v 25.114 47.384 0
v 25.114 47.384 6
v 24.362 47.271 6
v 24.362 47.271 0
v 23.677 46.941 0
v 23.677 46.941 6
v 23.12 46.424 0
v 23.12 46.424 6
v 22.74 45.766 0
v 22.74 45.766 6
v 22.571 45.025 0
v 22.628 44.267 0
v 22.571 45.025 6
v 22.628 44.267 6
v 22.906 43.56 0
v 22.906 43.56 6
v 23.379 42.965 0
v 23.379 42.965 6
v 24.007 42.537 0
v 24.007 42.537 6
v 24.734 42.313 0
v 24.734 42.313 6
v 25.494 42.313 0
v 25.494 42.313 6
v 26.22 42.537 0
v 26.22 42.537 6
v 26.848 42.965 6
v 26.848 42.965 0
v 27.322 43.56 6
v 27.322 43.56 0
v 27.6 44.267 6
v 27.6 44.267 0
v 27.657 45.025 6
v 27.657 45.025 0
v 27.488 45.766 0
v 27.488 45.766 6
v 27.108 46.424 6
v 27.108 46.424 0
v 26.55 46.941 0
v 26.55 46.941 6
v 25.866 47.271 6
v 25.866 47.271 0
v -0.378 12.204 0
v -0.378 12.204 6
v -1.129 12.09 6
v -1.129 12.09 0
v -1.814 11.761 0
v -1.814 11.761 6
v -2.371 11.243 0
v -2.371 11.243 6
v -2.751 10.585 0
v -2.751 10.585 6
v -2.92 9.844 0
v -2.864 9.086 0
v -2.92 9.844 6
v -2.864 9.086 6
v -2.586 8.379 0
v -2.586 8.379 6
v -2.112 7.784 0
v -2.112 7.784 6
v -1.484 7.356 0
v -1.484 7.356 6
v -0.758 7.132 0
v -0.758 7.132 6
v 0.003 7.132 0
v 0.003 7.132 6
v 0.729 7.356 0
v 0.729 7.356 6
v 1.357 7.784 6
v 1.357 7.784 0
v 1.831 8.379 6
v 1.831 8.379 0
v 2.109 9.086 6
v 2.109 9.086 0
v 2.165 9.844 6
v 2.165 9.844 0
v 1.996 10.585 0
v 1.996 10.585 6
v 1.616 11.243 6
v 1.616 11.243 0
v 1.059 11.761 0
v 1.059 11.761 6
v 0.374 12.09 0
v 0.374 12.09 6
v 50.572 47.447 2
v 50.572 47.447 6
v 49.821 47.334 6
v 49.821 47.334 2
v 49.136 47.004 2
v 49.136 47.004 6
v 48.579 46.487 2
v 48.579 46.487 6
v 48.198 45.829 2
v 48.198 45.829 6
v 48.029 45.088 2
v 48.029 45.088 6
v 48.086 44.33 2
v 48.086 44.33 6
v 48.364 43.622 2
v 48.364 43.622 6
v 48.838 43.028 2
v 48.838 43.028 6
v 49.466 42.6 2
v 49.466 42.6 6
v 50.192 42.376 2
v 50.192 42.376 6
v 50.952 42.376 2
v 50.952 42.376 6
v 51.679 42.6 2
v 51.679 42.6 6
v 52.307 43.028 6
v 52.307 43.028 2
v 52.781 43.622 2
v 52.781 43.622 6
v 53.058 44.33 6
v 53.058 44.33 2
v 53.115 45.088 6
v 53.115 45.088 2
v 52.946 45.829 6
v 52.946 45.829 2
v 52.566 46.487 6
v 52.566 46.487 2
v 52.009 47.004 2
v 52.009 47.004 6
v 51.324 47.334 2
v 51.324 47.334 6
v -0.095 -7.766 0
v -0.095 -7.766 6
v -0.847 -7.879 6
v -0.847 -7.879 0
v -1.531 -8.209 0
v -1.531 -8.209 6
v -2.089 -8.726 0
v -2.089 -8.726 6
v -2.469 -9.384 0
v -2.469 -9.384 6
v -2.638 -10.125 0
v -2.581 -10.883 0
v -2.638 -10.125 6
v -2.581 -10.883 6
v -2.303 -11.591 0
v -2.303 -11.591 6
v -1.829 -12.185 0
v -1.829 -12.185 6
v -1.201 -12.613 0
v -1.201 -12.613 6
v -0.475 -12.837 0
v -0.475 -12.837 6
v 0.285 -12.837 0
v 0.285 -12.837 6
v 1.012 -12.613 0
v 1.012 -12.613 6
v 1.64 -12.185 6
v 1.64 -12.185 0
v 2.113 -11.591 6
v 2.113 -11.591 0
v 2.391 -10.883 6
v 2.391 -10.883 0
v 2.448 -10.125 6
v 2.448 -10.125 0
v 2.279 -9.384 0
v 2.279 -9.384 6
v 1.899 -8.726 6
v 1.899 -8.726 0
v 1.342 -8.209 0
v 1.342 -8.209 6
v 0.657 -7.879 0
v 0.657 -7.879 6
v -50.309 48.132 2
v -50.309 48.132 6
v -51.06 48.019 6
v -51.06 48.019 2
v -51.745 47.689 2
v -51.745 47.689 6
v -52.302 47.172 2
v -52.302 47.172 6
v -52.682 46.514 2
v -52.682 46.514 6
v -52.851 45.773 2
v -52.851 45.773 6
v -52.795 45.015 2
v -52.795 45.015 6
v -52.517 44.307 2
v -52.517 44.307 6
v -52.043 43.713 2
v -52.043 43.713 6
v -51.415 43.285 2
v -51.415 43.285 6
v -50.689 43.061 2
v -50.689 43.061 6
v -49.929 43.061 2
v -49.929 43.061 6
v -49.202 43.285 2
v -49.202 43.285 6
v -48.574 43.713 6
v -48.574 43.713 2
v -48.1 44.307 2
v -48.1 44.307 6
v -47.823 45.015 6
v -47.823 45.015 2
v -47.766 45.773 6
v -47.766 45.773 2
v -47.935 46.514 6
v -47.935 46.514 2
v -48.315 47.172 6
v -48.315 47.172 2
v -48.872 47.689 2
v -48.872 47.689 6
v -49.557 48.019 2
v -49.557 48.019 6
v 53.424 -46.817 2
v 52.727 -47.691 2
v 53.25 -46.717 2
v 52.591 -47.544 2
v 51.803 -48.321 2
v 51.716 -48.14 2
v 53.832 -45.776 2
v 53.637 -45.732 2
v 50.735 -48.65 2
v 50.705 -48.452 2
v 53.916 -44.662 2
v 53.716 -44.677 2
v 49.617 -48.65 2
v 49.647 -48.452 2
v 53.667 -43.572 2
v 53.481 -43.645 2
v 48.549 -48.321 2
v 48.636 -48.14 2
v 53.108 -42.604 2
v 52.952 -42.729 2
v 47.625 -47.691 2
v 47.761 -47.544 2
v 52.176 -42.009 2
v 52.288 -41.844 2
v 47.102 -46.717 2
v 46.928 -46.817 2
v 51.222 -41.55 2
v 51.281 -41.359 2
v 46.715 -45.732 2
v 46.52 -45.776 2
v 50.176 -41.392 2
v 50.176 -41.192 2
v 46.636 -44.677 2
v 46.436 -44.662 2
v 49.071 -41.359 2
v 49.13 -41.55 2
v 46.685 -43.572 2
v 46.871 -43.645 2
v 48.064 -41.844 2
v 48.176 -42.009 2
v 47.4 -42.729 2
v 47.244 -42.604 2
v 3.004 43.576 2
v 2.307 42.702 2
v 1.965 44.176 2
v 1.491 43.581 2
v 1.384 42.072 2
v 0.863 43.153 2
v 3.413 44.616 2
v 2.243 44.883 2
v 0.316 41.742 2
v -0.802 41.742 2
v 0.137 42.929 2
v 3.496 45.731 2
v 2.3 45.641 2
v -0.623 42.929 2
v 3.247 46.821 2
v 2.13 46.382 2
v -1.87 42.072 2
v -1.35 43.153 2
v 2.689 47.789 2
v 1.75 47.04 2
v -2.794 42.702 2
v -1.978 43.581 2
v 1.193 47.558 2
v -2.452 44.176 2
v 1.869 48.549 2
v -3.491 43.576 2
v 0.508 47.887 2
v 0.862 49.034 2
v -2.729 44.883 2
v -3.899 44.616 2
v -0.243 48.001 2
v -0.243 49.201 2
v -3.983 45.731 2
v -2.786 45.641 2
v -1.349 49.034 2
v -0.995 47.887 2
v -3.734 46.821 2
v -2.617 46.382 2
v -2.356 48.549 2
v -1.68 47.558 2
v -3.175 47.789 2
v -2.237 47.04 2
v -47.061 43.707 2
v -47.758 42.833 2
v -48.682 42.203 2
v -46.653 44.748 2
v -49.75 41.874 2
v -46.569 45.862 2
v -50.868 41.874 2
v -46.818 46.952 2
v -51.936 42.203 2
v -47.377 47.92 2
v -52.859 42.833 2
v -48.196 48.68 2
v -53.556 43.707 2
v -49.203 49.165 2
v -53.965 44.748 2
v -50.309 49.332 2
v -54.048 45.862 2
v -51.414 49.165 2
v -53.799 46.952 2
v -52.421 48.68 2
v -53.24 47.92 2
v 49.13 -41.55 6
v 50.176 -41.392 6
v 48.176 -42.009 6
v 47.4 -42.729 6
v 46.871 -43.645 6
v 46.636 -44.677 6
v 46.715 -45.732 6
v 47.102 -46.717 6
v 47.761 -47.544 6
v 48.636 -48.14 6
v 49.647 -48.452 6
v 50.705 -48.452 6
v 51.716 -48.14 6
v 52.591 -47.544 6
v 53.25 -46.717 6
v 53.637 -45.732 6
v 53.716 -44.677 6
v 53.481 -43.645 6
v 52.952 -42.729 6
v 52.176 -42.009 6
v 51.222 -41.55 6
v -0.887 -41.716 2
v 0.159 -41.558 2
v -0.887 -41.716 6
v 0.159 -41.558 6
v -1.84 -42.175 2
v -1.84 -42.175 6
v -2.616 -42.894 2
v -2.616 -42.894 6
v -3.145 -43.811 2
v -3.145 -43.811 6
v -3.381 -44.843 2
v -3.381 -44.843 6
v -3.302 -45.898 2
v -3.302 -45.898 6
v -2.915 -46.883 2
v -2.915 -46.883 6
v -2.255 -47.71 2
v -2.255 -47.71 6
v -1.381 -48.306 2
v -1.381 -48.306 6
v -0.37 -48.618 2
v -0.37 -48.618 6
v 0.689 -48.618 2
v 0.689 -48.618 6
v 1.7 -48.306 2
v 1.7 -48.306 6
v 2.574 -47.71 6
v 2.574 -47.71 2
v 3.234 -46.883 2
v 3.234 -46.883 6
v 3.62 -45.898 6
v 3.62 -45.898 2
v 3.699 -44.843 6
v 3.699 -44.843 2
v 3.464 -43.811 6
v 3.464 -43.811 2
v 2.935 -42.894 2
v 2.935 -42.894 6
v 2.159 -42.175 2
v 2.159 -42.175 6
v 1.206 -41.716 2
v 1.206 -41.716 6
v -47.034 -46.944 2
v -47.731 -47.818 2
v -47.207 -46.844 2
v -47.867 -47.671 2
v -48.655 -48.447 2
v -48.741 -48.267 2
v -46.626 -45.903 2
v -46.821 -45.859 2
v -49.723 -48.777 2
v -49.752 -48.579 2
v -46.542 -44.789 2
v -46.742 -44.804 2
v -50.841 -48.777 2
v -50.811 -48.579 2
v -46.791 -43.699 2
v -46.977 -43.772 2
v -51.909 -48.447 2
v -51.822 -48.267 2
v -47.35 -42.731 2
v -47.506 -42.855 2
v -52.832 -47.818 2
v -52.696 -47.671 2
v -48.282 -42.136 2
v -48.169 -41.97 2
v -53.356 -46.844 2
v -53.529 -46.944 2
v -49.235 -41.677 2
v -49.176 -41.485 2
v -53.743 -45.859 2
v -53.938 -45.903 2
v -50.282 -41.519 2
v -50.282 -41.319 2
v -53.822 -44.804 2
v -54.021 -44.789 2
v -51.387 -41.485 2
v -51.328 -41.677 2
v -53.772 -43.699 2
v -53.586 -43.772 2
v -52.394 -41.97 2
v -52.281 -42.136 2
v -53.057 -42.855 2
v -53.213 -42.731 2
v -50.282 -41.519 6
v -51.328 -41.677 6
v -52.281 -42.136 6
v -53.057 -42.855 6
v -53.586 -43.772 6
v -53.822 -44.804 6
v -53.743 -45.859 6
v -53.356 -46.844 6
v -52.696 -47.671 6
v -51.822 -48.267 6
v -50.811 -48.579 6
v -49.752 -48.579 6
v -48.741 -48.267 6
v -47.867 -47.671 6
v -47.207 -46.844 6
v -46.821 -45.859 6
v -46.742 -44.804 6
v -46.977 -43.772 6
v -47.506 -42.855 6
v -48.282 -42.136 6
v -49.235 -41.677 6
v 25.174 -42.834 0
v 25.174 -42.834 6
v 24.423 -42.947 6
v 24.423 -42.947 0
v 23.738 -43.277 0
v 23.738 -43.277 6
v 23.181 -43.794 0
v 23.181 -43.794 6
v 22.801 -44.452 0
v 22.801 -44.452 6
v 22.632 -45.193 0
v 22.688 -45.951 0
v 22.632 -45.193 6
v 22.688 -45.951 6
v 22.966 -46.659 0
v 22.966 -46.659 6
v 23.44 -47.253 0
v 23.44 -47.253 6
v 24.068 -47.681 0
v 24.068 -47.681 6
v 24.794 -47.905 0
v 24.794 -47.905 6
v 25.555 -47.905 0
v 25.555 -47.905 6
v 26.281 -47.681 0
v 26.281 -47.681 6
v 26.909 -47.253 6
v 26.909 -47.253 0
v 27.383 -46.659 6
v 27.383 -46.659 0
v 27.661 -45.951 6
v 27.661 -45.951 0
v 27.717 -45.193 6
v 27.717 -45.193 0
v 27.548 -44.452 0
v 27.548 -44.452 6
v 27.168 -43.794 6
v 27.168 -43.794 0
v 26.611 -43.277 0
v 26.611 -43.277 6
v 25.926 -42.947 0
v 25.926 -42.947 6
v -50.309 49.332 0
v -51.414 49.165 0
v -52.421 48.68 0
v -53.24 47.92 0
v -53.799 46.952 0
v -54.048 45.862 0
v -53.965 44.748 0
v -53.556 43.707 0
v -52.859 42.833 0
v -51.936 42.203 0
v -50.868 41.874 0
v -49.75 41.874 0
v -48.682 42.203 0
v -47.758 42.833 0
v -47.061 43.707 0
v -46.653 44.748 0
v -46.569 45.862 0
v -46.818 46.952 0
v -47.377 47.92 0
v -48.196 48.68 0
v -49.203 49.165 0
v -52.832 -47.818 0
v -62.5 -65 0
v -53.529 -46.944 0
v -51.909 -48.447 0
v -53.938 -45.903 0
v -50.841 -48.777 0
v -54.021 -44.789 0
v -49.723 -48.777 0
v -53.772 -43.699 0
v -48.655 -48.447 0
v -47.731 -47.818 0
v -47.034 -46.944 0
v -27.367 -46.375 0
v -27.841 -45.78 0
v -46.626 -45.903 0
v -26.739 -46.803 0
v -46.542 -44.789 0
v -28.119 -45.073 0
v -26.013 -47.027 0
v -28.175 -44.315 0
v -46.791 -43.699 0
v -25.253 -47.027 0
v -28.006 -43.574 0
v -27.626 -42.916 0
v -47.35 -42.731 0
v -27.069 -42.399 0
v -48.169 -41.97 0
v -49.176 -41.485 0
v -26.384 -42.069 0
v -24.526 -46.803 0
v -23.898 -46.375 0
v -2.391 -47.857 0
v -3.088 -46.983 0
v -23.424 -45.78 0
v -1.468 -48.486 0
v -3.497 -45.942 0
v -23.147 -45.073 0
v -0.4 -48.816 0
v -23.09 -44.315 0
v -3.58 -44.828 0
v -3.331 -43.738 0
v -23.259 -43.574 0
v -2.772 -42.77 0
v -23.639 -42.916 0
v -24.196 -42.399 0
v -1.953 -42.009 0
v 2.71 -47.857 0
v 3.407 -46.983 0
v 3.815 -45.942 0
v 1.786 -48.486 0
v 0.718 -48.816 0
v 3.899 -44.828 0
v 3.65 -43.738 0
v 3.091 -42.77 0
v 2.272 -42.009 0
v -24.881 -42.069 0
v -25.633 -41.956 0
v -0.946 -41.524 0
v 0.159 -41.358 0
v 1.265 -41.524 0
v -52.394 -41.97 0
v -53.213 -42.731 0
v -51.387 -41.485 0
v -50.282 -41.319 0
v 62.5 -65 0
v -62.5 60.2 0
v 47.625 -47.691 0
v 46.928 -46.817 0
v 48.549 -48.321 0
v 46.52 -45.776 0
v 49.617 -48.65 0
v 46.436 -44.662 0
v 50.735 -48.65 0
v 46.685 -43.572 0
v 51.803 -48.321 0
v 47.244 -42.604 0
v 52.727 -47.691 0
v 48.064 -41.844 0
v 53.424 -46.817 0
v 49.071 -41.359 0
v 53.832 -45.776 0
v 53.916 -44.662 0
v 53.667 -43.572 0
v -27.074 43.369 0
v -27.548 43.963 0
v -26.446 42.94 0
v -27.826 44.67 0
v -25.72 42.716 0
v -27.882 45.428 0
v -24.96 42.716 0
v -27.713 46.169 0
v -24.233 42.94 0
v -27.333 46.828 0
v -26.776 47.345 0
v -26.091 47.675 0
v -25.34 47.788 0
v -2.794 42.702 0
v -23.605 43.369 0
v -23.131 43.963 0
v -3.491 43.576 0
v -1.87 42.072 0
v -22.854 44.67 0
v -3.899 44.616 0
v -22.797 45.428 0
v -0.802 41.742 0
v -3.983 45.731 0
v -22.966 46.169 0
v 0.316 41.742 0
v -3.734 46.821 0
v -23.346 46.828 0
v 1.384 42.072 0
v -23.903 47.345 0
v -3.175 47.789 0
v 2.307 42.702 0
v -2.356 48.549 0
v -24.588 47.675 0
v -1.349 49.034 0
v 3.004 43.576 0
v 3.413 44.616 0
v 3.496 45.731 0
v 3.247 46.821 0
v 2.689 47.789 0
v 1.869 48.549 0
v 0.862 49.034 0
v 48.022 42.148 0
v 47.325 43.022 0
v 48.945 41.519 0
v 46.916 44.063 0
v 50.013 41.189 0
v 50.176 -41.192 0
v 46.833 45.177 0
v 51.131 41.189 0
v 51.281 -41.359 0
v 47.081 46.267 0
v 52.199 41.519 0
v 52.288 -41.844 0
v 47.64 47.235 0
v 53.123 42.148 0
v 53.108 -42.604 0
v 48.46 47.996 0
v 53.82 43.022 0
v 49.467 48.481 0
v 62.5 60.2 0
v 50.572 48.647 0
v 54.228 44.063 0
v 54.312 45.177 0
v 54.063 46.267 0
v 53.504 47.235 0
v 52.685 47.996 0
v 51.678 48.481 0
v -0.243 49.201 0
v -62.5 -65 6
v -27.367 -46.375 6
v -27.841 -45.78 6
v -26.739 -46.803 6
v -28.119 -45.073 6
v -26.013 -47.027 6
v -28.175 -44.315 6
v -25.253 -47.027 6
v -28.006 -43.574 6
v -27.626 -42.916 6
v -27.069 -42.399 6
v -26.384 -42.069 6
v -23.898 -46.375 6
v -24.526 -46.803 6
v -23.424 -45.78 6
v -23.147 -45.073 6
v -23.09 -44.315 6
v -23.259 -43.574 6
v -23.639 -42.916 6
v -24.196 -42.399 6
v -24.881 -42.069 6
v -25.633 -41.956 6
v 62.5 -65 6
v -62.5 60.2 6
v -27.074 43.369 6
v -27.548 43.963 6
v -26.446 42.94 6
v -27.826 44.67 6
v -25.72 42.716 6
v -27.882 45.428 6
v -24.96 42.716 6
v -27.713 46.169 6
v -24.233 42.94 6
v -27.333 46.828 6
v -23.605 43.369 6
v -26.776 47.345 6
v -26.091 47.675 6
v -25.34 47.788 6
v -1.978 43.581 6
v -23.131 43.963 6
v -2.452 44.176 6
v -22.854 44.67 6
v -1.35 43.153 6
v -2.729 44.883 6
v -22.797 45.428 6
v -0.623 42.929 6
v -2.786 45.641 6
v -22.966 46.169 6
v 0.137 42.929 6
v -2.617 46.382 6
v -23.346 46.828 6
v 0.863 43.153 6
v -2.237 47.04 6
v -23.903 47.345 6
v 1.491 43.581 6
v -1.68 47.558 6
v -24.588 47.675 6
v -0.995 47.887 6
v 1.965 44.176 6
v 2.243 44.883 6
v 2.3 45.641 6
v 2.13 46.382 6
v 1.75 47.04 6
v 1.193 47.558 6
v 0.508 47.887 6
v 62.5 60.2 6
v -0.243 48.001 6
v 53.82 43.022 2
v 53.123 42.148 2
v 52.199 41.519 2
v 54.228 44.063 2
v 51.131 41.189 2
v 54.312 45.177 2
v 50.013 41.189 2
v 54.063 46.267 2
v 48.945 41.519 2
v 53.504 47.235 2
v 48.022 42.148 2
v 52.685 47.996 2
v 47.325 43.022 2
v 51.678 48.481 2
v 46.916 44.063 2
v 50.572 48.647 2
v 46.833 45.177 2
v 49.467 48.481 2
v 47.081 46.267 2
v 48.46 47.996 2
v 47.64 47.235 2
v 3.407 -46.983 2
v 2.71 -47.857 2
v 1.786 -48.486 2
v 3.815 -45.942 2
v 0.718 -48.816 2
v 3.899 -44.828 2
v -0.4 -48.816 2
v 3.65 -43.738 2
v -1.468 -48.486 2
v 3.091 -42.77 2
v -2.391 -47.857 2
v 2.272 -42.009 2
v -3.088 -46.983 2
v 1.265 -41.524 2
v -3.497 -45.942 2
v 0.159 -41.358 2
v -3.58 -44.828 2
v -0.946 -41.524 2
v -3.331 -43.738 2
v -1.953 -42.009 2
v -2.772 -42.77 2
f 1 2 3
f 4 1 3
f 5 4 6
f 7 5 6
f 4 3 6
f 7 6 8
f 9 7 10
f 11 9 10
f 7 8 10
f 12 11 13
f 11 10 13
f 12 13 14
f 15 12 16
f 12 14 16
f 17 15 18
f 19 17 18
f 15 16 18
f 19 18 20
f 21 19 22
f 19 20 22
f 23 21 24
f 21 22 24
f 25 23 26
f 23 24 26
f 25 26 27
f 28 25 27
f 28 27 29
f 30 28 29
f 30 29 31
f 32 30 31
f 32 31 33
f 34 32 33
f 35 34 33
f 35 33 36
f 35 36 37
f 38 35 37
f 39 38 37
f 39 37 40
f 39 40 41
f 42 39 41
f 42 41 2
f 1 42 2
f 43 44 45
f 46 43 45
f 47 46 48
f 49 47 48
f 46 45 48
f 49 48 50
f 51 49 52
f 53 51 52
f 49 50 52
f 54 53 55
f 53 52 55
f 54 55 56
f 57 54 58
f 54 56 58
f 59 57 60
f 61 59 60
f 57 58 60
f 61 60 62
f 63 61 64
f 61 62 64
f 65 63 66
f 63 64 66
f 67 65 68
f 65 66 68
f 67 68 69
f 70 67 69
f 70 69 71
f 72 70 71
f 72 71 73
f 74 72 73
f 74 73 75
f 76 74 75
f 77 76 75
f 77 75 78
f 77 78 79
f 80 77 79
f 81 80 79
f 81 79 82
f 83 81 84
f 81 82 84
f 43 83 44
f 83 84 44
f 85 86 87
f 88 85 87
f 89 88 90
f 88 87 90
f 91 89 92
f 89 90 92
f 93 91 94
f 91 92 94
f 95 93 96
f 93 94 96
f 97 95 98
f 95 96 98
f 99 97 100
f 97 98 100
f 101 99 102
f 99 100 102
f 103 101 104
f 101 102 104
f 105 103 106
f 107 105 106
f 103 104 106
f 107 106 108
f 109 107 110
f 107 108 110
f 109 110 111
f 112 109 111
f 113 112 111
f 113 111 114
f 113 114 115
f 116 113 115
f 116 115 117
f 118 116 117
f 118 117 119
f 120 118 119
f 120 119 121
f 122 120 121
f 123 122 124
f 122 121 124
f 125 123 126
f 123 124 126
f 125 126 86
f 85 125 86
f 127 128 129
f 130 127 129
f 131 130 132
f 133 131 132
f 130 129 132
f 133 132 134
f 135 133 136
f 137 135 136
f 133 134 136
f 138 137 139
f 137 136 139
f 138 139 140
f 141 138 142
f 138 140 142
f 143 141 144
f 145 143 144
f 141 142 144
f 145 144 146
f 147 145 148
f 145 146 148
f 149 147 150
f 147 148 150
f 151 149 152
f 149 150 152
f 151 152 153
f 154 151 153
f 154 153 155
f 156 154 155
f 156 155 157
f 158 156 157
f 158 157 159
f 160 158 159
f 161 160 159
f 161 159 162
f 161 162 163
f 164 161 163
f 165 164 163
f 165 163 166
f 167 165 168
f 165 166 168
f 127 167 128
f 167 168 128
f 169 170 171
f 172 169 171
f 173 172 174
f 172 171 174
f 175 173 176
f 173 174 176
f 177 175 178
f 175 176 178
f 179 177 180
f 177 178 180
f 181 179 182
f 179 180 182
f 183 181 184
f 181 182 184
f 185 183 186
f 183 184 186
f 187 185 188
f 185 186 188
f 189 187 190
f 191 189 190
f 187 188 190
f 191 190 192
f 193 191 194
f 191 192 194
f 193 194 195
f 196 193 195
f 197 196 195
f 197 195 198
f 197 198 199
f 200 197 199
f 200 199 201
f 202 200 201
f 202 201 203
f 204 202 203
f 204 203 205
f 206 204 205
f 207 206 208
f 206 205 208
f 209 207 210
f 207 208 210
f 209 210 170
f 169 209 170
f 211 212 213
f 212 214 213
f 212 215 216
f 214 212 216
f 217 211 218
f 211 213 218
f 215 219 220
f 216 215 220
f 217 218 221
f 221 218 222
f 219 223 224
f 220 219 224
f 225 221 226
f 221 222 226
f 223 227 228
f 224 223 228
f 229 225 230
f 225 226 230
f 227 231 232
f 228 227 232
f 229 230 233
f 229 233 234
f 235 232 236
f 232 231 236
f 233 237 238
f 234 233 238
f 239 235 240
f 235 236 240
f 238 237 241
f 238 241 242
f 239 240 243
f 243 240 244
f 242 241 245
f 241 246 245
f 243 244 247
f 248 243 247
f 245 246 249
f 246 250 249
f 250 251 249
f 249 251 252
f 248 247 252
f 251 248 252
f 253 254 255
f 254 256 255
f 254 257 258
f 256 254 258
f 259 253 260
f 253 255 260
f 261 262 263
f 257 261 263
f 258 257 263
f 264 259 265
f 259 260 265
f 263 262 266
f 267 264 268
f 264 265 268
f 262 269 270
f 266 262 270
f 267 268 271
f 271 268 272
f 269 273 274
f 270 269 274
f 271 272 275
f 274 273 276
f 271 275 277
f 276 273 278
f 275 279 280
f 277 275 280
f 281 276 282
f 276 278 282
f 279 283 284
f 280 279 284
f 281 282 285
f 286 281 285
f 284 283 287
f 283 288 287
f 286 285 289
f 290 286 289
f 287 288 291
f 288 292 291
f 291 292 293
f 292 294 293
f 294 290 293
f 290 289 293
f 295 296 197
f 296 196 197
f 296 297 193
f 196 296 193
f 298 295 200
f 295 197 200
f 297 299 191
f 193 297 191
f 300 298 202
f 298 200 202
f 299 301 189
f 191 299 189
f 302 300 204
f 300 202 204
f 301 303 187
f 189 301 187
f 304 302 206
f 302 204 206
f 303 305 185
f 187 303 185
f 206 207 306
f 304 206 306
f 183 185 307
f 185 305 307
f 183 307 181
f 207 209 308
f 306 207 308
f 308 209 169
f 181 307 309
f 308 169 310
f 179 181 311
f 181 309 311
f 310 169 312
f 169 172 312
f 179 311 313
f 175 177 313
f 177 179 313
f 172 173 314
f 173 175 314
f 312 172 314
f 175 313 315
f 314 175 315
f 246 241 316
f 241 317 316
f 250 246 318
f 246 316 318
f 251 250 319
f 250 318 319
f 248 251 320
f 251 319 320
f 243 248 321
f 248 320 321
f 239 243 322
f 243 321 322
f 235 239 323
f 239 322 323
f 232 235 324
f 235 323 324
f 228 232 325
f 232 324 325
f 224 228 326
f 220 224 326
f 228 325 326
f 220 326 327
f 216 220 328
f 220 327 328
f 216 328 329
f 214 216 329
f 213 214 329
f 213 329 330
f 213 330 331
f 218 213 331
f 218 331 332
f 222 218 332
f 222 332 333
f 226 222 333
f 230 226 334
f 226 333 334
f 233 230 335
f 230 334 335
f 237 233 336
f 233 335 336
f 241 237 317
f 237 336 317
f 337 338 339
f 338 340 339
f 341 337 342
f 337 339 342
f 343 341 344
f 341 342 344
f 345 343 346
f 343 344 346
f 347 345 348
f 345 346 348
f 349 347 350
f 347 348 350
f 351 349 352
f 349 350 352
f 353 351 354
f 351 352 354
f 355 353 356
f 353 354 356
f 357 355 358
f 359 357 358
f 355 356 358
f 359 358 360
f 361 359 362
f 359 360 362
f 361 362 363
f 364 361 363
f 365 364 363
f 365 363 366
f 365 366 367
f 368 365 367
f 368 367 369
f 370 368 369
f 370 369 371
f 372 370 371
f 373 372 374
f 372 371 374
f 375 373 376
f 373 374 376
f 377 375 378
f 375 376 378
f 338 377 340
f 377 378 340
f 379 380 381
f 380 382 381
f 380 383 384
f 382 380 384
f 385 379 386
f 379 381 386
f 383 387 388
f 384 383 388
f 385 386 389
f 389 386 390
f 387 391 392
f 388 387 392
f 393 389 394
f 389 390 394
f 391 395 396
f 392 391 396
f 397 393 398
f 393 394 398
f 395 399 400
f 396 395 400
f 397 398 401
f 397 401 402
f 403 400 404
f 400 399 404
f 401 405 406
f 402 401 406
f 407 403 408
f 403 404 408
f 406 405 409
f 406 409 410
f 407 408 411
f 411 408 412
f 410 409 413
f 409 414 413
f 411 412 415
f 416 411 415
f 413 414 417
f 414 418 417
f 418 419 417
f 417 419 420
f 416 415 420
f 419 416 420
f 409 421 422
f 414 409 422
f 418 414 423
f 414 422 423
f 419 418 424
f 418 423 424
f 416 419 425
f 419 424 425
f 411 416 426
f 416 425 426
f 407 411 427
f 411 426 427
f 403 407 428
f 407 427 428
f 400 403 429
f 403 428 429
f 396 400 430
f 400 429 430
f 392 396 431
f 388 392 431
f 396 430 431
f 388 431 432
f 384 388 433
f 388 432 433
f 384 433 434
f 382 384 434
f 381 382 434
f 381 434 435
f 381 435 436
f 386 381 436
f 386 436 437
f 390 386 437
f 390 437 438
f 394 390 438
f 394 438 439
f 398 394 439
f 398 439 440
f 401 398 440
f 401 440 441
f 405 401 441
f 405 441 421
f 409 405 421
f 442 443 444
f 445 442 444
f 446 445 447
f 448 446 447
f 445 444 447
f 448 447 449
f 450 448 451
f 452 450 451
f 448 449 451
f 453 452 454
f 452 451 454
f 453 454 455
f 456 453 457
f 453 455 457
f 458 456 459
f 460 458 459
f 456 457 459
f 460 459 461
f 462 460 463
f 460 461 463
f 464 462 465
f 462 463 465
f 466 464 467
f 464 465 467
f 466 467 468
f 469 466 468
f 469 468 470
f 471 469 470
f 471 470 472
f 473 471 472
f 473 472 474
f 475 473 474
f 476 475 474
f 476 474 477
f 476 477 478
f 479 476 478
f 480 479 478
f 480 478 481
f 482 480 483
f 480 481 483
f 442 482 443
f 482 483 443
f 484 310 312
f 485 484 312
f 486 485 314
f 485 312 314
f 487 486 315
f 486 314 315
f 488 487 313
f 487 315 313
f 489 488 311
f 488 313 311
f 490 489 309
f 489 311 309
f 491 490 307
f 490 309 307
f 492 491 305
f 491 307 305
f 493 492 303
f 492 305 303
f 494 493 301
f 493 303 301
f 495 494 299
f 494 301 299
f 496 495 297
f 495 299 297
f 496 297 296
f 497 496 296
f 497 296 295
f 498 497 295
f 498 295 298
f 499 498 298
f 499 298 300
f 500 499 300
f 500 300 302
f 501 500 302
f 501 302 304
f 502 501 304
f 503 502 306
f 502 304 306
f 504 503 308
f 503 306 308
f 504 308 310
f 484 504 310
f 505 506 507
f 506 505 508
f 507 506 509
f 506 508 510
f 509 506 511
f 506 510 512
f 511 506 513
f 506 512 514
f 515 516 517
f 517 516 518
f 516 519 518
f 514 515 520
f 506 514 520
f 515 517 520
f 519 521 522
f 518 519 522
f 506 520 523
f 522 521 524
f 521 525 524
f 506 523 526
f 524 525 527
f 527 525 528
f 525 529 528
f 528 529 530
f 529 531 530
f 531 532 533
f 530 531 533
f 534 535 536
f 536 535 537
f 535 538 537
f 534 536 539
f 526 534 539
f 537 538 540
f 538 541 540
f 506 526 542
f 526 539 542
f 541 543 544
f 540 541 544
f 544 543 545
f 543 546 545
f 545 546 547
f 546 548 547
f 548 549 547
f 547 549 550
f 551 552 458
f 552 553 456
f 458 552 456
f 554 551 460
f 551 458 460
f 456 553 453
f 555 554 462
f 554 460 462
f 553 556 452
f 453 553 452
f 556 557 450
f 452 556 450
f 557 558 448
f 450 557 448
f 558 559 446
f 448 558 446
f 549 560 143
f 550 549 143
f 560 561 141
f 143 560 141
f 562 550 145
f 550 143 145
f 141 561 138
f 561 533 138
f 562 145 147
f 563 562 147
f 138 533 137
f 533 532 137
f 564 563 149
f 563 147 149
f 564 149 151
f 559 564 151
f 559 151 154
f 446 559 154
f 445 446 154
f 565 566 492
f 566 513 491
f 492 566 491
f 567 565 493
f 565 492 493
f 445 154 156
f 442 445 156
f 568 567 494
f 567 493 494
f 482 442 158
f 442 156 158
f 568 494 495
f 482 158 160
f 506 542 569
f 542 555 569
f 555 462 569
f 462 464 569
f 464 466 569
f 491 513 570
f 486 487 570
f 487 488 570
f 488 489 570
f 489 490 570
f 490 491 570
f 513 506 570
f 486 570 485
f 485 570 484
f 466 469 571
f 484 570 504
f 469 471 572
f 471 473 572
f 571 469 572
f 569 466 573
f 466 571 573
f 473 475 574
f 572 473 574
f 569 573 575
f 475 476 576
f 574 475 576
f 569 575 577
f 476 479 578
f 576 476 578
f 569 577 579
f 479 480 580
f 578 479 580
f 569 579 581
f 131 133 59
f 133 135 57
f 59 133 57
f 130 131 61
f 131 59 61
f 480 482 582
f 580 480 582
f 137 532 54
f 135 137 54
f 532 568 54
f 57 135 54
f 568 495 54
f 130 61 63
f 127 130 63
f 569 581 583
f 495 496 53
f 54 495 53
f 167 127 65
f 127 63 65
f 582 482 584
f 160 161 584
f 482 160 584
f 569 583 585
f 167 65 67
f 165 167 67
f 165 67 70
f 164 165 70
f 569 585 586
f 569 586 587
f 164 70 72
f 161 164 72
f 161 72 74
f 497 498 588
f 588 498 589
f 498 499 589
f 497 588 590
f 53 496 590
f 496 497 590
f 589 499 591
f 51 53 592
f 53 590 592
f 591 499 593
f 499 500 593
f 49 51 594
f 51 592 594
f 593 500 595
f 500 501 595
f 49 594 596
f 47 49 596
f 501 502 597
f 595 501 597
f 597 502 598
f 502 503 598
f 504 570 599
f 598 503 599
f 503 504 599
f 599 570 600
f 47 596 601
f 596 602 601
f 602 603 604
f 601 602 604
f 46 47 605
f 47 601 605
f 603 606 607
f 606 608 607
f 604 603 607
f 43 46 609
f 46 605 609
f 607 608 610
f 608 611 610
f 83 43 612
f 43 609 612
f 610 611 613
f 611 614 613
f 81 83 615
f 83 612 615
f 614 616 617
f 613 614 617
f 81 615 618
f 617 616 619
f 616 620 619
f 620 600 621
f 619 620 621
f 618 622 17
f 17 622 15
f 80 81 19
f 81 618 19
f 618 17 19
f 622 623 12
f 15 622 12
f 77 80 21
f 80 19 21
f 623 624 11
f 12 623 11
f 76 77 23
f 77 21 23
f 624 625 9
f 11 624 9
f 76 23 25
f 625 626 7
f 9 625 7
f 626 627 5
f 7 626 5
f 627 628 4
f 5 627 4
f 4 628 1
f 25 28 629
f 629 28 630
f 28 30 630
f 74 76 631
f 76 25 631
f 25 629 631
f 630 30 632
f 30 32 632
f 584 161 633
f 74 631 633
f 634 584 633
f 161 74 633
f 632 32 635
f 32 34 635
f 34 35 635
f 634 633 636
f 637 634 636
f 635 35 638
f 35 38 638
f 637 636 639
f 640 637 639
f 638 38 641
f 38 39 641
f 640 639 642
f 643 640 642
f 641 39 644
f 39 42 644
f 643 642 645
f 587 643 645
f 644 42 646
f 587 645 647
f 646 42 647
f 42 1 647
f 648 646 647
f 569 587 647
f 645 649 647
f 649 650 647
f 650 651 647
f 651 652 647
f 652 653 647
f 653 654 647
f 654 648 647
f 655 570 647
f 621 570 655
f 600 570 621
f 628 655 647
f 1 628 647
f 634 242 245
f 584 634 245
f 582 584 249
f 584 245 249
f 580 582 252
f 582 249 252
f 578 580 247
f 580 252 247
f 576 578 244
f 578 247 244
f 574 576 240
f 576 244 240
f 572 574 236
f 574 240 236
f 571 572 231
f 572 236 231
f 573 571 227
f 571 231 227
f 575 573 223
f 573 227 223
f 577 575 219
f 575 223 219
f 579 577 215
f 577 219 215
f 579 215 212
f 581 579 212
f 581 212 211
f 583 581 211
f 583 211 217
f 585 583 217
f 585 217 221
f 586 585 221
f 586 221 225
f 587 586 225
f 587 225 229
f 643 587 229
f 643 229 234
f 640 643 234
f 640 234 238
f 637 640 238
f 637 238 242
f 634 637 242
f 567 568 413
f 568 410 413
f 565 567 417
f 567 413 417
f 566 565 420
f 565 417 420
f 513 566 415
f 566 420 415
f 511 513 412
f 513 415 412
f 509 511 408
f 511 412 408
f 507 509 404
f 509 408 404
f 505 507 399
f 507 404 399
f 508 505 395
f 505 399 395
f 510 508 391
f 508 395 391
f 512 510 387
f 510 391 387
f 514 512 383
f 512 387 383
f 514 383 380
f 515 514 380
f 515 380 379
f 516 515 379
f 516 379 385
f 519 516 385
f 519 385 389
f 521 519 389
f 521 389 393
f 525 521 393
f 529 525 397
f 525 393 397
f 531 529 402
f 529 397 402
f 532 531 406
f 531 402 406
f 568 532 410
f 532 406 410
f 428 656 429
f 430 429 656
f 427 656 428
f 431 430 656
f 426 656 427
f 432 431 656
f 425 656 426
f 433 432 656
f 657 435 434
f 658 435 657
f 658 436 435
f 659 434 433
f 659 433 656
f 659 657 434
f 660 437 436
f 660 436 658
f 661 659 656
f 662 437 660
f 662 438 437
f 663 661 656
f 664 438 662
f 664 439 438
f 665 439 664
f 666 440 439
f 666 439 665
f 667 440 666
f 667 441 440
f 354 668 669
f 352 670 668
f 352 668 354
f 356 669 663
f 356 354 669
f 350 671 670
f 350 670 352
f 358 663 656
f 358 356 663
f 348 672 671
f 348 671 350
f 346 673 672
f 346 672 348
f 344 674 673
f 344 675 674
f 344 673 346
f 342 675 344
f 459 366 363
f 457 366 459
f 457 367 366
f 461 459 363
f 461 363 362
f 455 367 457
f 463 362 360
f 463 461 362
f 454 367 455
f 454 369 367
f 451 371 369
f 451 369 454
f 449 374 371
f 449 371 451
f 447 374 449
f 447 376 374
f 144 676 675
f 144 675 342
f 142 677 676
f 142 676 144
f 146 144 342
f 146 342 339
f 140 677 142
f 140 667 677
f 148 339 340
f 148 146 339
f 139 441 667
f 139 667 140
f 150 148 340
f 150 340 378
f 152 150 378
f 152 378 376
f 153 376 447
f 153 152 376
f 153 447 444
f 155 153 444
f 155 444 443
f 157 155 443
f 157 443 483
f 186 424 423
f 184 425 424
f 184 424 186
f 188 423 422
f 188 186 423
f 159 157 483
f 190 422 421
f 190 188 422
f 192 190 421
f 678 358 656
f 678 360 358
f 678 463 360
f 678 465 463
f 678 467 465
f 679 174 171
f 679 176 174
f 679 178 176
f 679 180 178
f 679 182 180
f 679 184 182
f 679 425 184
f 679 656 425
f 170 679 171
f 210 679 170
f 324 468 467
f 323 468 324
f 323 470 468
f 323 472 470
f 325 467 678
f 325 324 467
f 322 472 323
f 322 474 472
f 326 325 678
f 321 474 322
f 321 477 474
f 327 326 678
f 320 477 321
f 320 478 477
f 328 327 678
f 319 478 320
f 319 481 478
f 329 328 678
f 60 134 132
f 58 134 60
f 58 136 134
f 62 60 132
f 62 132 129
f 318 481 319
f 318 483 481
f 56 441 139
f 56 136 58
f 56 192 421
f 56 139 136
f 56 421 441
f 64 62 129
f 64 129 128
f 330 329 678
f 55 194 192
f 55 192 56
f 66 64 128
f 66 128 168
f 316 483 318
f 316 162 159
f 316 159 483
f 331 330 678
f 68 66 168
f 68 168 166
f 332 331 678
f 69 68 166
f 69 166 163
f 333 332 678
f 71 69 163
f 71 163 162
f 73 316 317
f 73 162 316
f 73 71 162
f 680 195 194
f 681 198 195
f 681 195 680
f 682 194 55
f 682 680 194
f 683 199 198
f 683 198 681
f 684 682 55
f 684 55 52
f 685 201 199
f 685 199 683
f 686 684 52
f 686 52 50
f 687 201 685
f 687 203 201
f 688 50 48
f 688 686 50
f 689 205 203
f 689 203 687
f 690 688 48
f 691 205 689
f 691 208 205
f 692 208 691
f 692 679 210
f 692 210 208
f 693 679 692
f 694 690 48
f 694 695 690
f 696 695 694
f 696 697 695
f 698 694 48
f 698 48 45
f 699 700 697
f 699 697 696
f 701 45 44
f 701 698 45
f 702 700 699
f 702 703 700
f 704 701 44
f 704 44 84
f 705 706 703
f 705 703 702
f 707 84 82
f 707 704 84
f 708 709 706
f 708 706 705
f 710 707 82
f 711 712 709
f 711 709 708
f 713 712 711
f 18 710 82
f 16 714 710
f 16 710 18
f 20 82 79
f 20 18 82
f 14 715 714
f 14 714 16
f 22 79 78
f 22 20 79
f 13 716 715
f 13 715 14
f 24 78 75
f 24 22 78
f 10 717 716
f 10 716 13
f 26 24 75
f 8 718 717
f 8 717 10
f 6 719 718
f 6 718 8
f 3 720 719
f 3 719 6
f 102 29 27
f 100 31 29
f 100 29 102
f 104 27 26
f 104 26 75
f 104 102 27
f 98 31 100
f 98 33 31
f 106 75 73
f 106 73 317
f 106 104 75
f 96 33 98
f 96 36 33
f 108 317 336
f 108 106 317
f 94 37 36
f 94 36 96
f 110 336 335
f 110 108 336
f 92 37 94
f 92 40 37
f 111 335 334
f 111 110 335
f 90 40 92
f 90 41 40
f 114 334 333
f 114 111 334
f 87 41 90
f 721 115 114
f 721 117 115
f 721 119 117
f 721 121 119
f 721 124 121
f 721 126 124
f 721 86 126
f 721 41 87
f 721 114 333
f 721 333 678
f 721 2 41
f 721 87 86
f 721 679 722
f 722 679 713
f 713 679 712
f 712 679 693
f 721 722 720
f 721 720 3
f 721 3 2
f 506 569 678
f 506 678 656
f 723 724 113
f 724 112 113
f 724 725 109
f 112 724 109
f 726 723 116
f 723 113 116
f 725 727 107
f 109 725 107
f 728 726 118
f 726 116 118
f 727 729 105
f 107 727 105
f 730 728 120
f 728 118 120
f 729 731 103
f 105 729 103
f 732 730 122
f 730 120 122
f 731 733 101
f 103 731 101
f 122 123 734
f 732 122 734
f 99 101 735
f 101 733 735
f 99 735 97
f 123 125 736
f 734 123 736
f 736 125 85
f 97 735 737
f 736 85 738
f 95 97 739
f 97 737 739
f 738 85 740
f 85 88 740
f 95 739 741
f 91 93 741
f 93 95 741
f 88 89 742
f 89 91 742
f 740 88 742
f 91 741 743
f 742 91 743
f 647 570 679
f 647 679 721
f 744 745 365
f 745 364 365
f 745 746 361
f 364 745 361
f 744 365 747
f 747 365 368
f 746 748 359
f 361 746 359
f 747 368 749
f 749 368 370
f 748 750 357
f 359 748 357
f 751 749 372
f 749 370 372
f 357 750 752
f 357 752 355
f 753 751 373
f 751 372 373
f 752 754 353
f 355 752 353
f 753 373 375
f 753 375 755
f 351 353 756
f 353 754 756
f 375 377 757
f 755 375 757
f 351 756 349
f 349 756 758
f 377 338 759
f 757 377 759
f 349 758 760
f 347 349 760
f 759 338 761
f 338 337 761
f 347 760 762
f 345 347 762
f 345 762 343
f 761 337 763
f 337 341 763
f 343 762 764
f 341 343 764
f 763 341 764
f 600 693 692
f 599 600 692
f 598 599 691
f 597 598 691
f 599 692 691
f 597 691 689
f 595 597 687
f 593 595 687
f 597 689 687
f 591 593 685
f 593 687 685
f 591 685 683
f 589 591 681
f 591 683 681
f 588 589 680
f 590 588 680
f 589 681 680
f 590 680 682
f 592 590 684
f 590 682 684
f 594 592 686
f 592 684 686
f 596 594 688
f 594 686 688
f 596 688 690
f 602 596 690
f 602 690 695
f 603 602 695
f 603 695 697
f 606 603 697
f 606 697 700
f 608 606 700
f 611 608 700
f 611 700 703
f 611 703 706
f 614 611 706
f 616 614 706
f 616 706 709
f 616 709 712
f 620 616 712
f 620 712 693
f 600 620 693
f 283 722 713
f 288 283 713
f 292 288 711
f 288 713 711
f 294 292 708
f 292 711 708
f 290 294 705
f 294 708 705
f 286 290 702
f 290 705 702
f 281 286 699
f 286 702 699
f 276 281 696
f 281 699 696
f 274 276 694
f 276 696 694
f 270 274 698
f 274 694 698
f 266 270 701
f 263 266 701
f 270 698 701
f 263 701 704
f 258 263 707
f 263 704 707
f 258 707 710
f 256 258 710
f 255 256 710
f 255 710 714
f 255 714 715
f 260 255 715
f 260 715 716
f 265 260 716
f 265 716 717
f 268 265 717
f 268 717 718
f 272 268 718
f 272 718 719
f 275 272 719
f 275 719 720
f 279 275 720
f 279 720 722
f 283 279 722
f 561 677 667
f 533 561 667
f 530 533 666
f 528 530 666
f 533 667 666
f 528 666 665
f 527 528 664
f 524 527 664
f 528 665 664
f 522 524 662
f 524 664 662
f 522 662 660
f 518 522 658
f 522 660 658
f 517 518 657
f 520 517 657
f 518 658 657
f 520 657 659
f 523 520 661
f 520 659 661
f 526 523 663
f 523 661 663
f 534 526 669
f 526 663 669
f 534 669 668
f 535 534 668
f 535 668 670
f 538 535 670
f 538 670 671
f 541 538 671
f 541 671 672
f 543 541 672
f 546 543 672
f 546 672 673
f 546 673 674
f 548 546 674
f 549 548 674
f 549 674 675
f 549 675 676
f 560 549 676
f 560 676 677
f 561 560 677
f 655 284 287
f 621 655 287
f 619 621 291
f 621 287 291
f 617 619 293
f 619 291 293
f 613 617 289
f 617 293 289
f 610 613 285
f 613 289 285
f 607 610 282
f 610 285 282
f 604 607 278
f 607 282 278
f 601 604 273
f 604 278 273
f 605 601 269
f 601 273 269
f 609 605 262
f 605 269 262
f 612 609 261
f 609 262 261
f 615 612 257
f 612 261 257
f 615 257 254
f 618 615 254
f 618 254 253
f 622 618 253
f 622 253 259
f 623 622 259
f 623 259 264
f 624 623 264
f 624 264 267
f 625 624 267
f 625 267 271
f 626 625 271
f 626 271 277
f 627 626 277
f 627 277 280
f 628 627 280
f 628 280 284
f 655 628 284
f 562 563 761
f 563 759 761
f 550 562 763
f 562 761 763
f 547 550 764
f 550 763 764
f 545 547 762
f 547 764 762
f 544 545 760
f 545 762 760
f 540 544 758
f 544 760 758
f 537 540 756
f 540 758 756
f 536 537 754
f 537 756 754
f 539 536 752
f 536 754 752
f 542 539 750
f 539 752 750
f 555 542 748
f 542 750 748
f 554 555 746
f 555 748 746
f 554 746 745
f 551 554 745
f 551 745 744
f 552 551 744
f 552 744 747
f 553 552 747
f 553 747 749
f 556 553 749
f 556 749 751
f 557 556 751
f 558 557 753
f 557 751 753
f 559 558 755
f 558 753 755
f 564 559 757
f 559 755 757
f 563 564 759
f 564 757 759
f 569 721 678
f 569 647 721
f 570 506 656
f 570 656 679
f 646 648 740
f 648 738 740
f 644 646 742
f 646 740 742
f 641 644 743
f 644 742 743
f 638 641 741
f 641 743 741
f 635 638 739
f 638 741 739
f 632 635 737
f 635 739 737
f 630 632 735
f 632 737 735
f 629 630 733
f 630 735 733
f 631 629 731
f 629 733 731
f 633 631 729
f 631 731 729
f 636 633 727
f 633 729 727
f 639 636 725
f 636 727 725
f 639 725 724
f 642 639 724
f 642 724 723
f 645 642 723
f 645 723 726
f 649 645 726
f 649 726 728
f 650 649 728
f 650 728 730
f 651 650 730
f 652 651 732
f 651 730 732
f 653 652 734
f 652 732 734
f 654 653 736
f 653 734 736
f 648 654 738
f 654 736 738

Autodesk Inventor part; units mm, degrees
ref_plane "YZ Plane" through (0, 0, 0) normal (1, 0, 0) x (0, 1, 0)
ref_plane "XZ Plane" through (0, 0, 0) normal (0, 1, 0) x (-1, 0, 0)
ref_plane "XY Plane" through (0, 0, 0) normal (0, 0, 1) x (1, 0, 0)
ref_plane "Work Plane1" through (0, 0, 0) normal (0, 0, 1) x (1, 0, 0)
sketch "Sketch1" plane through (0, 0, 0) normal (0, 0, 1) x (1, 0, 0)
  line L0 (-62.5, -65) -> (-62.5, 60.2) projected
  line L1 (62.5, -65) -> (-62.5, -65) projected
  line L2 (-62.5, 60.2) -> (62.5, 60.2) projected
  line L3 (62.5, 60.2) -> (62.5, -65) projected
  circle A0 centre (50.2, 45) radius 2.55 projected
  circle A1 centre (50.2, -45) radius 3.55 projected
  circle A2 centre (-50.2, -45) radius 2.55 projected
  circle A3 centre (-50.2, 45) radius 2.55 projected
  line L4 (-50.2, -87.1872) -> (-50.2, 86.9163) construction
  line L5 (0, -90.5792) -> (0, 86.9163) construction
  line L6 (50.2, -82.9351) -> (50.2, 98.888) construction
  line L7 (-25.1, -100.0293) -> (-25.1, 98.888) construction
  line L8 (25.1, -87.1872) -> (25.1, 98.888) construction
  line L9 (-84.1215, -10) -> (86.0151, -10) construction
  line L10 (-84.1215, 10) -> (86.0151, 10) construction
  point P0 (0, 0)
  point P1 (0, 45)
  point P2 (0, -45)
  point P3 (-25.1, -45)
  point P4 (25.1, -45)
  point P5 (25.1, 45)
  point P6 (-25.1, 45)
  point P7 (0, 0)
  point P8 (0, -10)
  point P9 (0, 10)
  dimension "d0" = 100.4
  dimension "d1" = 50.2
  dimension "d2" = 25.1
  dimension "d3" = 25.1
  dimension "d4" = 10
  dimension "d5" = 20
extrude "Extrusion1" add sketch "Sketch1" along normal blind 6 contours L0 L2 L3 L1 | A0 | A1 | A2 | A3
sketch "Sketch2" plane through (0, 0, 0) normal (0, 0, -1) x (-1, 0, 0)
  point P0 (0, 0)
  point P1 (-50.176, -44.9419)
  point P2 (-0.1594, -45.1078)
  point P3 (50.2816, -45.0688)
hole "Hole1" at (50.176, -44.9419, 0) at (0.1594, -45.1078, 0) at (-50.2816, -45.0688, 0) direction (0, 0, 1) diameter 7.1 end through all counterbore diameter 7.5 counterbore depth 2
sketch "Sketch3" plane through (0, 0, 0) normal (0, 0, -1) x (-1, 0, 0)
  point P0 (0, 0)
  point P1 (50.3086, 45.5821)
  point P2 (0.2433, 45.4506)
  point P3 (-50.5722, 44.8972)
hole "Hole2" at (-50.3086, 45.5821, 0) at (-0.2433, 45.4506, 0) at (50.5722, 44.8972, 0) direction (0, 0, 1) diameter 5.1 end through all counterbore diameter 7.5 counterbore depth 2
sketch "Sketch4" plane through (0, 0, 0) normal (0, 0, -1) x (-1, 0, 0)
  point P0 (0, 0)
  point P1 (25.3396, 45.2378)
  point P2 (-25.1139, 44.8345)
  point P3 (-25.1745, -45.3838)
  point P4 (25.6326, -44.5055)
  point P5 (0.0949, -10.3157)
  point P6 (0.3775, 9.6536)
hole "Hole3" at (25.1139, 44.8345, 0) at (-25.3396, 45.2378, 0) at (25.1745, -45.3838, 0) at (-25.6326, -44.5055, 0) at (-0.0949, -10.3157, 0) at (-0.3775, 9.6536, 0) direction (0, 0, 1) diameter 5.1 end through all
sketch "Sketch5" plane through (0, 0, 6) normal (0, 0, 1) x (1, 0, 0)
  line L0 (54.8683, -25.7428) -> (1.0212, -25.7428) construction
  line L1 (1.0212, -25.7428) -> (1.0212, -17.8731) construction
  line L2 (1.0212, -17.8731) -> (54.8683, -17.8731) construction
  line L3 (54.8683, -17.8731) -> (54.8683, -25.7428) construction
  point P0 (0, 0)
equation "\"d1\" = 0.5 * d0"
equation "\"d2\" = 0.5 * d1"
equation "\"d3\" = d2"
properties part number "X axis carriage small 2"
